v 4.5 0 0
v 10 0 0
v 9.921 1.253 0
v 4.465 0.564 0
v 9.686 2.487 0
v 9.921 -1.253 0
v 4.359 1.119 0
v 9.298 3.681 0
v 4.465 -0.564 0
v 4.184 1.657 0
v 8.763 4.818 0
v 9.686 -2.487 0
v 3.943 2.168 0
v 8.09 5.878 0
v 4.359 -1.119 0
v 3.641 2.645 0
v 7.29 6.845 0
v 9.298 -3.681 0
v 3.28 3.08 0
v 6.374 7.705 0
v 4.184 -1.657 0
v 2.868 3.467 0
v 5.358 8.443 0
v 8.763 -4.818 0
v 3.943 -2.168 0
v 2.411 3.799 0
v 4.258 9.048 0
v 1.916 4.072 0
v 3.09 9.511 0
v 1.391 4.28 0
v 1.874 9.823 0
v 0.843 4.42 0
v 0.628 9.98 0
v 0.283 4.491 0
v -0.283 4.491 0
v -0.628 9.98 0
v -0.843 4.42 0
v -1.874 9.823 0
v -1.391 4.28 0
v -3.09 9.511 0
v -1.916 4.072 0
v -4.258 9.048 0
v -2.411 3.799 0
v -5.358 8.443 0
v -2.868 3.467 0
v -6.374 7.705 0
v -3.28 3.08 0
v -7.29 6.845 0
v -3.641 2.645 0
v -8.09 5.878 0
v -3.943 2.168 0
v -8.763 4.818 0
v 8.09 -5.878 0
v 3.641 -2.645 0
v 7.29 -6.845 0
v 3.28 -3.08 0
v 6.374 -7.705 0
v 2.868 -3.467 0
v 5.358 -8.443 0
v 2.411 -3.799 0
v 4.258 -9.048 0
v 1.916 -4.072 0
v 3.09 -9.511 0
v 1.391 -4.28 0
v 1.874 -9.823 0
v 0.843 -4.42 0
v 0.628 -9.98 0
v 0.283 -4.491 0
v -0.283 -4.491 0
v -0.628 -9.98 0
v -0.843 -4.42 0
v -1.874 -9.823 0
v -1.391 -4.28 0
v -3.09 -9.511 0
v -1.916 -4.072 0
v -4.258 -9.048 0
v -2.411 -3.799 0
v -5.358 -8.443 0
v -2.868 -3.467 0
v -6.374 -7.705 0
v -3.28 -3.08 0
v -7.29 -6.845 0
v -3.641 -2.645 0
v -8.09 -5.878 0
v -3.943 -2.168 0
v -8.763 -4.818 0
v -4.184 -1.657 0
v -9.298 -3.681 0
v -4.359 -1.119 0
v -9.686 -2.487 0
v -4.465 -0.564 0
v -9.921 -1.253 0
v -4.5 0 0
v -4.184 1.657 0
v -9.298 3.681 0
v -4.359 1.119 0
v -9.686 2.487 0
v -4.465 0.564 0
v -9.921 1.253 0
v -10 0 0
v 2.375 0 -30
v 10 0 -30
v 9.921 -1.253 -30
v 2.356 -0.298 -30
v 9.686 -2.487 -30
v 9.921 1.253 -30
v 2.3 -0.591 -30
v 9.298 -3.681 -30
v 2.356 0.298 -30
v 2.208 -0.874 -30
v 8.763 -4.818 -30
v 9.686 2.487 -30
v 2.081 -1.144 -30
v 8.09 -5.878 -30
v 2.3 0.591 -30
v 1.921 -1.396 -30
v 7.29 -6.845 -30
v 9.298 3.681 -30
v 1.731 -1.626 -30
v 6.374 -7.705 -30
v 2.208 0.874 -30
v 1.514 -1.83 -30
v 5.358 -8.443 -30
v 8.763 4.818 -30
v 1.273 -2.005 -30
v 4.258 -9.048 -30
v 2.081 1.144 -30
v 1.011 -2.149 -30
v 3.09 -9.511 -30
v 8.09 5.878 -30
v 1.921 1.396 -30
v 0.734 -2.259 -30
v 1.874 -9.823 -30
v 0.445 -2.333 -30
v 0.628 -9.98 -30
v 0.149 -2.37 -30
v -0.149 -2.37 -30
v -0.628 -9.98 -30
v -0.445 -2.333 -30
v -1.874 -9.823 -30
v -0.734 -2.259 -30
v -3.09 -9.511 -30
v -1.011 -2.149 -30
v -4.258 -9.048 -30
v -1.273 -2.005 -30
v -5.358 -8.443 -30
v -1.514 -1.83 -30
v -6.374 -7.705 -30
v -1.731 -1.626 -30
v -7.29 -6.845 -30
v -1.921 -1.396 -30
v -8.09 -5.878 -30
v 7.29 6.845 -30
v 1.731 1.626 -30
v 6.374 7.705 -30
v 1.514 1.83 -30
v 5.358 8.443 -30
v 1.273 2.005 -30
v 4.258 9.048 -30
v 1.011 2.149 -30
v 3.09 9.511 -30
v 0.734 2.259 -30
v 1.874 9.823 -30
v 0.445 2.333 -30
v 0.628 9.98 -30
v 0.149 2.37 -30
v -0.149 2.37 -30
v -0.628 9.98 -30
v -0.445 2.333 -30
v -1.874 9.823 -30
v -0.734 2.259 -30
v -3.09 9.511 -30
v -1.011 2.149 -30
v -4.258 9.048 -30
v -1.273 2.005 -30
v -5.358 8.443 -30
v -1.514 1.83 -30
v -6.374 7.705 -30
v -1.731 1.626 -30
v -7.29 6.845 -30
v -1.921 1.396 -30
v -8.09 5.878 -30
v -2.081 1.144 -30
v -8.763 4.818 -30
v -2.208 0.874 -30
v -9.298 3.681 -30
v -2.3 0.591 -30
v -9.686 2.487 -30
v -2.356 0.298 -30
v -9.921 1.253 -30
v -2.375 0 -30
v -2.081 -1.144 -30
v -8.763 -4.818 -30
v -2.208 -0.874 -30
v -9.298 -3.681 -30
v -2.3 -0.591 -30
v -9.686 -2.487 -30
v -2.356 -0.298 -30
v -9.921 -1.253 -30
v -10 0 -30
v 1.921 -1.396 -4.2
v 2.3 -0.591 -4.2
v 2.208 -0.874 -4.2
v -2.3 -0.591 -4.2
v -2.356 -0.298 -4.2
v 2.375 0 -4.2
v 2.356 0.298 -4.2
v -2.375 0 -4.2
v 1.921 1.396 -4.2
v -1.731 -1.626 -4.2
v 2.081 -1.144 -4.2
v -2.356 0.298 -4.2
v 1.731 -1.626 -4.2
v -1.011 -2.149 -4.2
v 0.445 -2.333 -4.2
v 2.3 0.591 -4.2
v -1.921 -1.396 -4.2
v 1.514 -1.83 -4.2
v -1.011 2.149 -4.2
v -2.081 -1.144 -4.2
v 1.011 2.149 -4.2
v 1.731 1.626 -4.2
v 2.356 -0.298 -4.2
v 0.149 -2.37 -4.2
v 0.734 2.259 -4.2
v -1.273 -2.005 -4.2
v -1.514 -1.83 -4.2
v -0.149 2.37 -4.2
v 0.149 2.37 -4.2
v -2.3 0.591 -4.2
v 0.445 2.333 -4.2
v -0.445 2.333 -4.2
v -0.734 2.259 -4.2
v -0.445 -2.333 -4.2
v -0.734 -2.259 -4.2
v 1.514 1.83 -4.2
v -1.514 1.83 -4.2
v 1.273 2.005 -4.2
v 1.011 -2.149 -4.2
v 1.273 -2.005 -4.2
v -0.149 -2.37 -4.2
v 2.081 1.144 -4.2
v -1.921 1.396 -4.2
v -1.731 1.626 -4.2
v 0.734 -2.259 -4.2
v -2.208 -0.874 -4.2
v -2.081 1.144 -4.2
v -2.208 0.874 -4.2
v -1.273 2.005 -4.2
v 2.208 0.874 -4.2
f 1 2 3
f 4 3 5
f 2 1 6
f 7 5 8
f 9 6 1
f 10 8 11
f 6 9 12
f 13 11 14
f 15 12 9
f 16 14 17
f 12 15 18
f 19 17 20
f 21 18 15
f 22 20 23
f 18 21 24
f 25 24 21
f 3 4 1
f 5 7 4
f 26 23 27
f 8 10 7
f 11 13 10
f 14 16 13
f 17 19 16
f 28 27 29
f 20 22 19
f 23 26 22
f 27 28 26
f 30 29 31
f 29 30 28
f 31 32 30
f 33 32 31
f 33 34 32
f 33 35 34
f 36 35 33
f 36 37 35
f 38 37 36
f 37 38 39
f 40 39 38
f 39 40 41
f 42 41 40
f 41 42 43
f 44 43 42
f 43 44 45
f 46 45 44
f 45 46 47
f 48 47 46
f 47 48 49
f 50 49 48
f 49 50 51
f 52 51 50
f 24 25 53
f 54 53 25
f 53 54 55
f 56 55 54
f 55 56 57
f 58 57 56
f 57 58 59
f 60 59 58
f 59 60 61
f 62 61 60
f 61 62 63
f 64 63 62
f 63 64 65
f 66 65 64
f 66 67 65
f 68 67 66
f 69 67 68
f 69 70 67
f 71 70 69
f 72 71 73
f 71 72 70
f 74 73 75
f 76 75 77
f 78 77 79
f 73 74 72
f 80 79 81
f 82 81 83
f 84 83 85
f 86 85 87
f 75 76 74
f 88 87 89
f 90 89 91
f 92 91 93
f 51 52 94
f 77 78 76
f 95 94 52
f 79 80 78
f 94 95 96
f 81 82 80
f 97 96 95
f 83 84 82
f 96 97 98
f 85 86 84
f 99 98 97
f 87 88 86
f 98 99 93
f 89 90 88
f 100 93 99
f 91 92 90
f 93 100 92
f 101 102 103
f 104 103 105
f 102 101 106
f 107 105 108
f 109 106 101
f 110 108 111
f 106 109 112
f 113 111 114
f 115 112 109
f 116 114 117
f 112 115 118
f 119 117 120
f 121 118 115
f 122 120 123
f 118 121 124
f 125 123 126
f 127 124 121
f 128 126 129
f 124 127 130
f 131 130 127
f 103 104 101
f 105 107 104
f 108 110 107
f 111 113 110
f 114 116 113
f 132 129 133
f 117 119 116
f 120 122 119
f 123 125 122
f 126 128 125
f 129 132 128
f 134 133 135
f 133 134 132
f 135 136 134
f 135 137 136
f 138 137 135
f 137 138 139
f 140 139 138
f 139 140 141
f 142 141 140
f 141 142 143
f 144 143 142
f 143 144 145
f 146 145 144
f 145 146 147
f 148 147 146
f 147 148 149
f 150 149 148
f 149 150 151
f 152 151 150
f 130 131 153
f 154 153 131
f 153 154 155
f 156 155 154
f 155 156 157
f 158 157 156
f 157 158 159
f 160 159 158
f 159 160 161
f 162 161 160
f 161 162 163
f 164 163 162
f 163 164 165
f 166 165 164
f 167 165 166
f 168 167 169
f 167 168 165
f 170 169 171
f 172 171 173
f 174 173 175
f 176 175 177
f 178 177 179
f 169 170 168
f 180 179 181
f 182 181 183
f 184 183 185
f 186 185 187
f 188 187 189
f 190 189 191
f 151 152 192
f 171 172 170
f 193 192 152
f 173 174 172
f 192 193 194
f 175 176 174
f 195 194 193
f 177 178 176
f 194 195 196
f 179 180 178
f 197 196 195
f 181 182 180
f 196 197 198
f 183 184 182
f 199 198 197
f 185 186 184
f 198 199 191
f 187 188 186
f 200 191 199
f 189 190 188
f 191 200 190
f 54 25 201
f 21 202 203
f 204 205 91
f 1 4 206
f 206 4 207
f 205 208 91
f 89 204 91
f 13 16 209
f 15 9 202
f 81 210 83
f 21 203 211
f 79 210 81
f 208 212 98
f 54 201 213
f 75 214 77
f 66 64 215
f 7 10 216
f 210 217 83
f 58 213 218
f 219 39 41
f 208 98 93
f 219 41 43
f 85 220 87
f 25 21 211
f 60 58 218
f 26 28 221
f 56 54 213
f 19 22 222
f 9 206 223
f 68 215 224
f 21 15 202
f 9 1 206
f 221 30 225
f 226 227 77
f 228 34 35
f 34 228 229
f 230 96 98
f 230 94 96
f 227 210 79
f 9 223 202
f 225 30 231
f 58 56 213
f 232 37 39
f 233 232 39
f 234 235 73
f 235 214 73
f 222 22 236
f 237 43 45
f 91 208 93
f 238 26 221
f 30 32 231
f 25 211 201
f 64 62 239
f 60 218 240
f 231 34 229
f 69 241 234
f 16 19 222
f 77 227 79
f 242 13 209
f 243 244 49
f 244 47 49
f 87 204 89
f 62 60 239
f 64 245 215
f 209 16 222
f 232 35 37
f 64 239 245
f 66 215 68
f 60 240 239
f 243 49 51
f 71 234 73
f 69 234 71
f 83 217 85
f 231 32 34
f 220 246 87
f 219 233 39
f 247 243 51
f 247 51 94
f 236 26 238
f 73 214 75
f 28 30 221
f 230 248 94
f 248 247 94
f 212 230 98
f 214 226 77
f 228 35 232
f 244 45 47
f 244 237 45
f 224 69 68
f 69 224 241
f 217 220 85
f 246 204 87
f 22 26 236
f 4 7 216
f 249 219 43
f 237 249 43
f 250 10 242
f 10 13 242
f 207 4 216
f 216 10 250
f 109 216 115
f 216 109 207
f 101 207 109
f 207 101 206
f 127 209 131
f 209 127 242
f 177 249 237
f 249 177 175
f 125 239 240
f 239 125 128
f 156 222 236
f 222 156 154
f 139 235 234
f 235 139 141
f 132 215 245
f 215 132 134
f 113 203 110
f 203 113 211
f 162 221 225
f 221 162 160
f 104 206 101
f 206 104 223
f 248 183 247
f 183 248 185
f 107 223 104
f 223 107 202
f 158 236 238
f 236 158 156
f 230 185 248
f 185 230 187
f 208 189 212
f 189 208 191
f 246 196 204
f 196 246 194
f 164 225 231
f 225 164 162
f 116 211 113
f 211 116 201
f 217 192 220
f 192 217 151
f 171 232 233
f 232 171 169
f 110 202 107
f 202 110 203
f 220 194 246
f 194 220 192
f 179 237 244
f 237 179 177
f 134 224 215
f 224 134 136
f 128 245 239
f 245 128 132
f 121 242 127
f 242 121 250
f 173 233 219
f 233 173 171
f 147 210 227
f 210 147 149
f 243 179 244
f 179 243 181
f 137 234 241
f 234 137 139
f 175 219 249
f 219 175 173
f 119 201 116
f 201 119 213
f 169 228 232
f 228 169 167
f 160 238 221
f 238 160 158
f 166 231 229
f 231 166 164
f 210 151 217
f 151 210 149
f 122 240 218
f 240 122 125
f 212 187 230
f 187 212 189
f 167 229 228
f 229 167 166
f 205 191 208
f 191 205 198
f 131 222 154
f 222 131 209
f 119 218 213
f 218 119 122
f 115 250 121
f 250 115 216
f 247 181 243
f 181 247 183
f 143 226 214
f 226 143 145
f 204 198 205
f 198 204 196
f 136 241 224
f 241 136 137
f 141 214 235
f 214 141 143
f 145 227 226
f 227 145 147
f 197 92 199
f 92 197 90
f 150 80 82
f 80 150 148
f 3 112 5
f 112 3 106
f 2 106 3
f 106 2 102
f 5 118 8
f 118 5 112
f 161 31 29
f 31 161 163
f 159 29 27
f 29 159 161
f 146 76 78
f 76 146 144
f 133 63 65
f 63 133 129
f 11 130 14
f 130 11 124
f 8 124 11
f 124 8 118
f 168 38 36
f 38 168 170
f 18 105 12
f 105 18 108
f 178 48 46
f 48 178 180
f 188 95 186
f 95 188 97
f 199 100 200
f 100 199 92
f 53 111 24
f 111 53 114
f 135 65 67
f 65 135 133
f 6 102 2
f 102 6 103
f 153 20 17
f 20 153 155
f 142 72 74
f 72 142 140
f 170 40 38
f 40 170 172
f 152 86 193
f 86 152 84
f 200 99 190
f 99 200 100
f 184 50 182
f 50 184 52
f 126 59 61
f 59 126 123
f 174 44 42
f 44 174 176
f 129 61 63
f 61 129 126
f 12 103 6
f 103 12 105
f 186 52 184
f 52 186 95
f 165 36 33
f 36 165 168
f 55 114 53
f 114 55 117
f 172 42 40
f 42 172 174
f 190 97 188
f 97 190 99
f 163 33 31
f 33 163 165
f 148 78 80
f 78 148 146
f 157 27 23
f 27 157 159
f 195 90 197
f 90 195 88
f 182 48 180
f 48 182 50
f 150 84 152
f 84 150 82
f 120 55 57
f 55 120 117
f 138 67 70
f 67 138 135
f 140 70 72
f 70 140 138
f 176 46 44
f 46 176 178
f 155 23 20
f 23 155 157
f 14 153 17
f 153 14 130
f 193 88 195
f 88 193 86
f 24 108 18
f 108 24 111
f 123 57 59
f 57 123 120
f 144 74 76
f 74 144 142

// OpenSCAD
$fn = 50;


difference() {
	union() {
		translate(v = [0, 0, -30.0000000000]) {
			cylinder(h = 30, r = 10.0000000000);
		}
		cylinder(h = 0, r = 13.0000000000);
	}
	union() {
		translate(v = [0, 0, 0]) {
			rotate(a = [0, 0, 0]) {
				difference() {
					union() {
						#translate(v = [0, 0, -30.0000000000]) {
							cylinder(h = 30, r = 2.2500000000);
						}
						#translate(v = [0, 0, -4.2000000000]) {
							cylinder(h = 4.2000000000, r = 10.0000000000, r1 = 2.3750000000, r2 = 4.5000000000);
						}
						#translate(v = [0, 0, -30.0000000000]) {
							cylinder(h = 30, r = 2.3750000000);
						}
						#translate(v = [0, 0, -30.0000000000]) {
							cylinder(h = 30, r = 2.2500000000);
						}
					}
					union();
				}
			}
		}
	}
}
